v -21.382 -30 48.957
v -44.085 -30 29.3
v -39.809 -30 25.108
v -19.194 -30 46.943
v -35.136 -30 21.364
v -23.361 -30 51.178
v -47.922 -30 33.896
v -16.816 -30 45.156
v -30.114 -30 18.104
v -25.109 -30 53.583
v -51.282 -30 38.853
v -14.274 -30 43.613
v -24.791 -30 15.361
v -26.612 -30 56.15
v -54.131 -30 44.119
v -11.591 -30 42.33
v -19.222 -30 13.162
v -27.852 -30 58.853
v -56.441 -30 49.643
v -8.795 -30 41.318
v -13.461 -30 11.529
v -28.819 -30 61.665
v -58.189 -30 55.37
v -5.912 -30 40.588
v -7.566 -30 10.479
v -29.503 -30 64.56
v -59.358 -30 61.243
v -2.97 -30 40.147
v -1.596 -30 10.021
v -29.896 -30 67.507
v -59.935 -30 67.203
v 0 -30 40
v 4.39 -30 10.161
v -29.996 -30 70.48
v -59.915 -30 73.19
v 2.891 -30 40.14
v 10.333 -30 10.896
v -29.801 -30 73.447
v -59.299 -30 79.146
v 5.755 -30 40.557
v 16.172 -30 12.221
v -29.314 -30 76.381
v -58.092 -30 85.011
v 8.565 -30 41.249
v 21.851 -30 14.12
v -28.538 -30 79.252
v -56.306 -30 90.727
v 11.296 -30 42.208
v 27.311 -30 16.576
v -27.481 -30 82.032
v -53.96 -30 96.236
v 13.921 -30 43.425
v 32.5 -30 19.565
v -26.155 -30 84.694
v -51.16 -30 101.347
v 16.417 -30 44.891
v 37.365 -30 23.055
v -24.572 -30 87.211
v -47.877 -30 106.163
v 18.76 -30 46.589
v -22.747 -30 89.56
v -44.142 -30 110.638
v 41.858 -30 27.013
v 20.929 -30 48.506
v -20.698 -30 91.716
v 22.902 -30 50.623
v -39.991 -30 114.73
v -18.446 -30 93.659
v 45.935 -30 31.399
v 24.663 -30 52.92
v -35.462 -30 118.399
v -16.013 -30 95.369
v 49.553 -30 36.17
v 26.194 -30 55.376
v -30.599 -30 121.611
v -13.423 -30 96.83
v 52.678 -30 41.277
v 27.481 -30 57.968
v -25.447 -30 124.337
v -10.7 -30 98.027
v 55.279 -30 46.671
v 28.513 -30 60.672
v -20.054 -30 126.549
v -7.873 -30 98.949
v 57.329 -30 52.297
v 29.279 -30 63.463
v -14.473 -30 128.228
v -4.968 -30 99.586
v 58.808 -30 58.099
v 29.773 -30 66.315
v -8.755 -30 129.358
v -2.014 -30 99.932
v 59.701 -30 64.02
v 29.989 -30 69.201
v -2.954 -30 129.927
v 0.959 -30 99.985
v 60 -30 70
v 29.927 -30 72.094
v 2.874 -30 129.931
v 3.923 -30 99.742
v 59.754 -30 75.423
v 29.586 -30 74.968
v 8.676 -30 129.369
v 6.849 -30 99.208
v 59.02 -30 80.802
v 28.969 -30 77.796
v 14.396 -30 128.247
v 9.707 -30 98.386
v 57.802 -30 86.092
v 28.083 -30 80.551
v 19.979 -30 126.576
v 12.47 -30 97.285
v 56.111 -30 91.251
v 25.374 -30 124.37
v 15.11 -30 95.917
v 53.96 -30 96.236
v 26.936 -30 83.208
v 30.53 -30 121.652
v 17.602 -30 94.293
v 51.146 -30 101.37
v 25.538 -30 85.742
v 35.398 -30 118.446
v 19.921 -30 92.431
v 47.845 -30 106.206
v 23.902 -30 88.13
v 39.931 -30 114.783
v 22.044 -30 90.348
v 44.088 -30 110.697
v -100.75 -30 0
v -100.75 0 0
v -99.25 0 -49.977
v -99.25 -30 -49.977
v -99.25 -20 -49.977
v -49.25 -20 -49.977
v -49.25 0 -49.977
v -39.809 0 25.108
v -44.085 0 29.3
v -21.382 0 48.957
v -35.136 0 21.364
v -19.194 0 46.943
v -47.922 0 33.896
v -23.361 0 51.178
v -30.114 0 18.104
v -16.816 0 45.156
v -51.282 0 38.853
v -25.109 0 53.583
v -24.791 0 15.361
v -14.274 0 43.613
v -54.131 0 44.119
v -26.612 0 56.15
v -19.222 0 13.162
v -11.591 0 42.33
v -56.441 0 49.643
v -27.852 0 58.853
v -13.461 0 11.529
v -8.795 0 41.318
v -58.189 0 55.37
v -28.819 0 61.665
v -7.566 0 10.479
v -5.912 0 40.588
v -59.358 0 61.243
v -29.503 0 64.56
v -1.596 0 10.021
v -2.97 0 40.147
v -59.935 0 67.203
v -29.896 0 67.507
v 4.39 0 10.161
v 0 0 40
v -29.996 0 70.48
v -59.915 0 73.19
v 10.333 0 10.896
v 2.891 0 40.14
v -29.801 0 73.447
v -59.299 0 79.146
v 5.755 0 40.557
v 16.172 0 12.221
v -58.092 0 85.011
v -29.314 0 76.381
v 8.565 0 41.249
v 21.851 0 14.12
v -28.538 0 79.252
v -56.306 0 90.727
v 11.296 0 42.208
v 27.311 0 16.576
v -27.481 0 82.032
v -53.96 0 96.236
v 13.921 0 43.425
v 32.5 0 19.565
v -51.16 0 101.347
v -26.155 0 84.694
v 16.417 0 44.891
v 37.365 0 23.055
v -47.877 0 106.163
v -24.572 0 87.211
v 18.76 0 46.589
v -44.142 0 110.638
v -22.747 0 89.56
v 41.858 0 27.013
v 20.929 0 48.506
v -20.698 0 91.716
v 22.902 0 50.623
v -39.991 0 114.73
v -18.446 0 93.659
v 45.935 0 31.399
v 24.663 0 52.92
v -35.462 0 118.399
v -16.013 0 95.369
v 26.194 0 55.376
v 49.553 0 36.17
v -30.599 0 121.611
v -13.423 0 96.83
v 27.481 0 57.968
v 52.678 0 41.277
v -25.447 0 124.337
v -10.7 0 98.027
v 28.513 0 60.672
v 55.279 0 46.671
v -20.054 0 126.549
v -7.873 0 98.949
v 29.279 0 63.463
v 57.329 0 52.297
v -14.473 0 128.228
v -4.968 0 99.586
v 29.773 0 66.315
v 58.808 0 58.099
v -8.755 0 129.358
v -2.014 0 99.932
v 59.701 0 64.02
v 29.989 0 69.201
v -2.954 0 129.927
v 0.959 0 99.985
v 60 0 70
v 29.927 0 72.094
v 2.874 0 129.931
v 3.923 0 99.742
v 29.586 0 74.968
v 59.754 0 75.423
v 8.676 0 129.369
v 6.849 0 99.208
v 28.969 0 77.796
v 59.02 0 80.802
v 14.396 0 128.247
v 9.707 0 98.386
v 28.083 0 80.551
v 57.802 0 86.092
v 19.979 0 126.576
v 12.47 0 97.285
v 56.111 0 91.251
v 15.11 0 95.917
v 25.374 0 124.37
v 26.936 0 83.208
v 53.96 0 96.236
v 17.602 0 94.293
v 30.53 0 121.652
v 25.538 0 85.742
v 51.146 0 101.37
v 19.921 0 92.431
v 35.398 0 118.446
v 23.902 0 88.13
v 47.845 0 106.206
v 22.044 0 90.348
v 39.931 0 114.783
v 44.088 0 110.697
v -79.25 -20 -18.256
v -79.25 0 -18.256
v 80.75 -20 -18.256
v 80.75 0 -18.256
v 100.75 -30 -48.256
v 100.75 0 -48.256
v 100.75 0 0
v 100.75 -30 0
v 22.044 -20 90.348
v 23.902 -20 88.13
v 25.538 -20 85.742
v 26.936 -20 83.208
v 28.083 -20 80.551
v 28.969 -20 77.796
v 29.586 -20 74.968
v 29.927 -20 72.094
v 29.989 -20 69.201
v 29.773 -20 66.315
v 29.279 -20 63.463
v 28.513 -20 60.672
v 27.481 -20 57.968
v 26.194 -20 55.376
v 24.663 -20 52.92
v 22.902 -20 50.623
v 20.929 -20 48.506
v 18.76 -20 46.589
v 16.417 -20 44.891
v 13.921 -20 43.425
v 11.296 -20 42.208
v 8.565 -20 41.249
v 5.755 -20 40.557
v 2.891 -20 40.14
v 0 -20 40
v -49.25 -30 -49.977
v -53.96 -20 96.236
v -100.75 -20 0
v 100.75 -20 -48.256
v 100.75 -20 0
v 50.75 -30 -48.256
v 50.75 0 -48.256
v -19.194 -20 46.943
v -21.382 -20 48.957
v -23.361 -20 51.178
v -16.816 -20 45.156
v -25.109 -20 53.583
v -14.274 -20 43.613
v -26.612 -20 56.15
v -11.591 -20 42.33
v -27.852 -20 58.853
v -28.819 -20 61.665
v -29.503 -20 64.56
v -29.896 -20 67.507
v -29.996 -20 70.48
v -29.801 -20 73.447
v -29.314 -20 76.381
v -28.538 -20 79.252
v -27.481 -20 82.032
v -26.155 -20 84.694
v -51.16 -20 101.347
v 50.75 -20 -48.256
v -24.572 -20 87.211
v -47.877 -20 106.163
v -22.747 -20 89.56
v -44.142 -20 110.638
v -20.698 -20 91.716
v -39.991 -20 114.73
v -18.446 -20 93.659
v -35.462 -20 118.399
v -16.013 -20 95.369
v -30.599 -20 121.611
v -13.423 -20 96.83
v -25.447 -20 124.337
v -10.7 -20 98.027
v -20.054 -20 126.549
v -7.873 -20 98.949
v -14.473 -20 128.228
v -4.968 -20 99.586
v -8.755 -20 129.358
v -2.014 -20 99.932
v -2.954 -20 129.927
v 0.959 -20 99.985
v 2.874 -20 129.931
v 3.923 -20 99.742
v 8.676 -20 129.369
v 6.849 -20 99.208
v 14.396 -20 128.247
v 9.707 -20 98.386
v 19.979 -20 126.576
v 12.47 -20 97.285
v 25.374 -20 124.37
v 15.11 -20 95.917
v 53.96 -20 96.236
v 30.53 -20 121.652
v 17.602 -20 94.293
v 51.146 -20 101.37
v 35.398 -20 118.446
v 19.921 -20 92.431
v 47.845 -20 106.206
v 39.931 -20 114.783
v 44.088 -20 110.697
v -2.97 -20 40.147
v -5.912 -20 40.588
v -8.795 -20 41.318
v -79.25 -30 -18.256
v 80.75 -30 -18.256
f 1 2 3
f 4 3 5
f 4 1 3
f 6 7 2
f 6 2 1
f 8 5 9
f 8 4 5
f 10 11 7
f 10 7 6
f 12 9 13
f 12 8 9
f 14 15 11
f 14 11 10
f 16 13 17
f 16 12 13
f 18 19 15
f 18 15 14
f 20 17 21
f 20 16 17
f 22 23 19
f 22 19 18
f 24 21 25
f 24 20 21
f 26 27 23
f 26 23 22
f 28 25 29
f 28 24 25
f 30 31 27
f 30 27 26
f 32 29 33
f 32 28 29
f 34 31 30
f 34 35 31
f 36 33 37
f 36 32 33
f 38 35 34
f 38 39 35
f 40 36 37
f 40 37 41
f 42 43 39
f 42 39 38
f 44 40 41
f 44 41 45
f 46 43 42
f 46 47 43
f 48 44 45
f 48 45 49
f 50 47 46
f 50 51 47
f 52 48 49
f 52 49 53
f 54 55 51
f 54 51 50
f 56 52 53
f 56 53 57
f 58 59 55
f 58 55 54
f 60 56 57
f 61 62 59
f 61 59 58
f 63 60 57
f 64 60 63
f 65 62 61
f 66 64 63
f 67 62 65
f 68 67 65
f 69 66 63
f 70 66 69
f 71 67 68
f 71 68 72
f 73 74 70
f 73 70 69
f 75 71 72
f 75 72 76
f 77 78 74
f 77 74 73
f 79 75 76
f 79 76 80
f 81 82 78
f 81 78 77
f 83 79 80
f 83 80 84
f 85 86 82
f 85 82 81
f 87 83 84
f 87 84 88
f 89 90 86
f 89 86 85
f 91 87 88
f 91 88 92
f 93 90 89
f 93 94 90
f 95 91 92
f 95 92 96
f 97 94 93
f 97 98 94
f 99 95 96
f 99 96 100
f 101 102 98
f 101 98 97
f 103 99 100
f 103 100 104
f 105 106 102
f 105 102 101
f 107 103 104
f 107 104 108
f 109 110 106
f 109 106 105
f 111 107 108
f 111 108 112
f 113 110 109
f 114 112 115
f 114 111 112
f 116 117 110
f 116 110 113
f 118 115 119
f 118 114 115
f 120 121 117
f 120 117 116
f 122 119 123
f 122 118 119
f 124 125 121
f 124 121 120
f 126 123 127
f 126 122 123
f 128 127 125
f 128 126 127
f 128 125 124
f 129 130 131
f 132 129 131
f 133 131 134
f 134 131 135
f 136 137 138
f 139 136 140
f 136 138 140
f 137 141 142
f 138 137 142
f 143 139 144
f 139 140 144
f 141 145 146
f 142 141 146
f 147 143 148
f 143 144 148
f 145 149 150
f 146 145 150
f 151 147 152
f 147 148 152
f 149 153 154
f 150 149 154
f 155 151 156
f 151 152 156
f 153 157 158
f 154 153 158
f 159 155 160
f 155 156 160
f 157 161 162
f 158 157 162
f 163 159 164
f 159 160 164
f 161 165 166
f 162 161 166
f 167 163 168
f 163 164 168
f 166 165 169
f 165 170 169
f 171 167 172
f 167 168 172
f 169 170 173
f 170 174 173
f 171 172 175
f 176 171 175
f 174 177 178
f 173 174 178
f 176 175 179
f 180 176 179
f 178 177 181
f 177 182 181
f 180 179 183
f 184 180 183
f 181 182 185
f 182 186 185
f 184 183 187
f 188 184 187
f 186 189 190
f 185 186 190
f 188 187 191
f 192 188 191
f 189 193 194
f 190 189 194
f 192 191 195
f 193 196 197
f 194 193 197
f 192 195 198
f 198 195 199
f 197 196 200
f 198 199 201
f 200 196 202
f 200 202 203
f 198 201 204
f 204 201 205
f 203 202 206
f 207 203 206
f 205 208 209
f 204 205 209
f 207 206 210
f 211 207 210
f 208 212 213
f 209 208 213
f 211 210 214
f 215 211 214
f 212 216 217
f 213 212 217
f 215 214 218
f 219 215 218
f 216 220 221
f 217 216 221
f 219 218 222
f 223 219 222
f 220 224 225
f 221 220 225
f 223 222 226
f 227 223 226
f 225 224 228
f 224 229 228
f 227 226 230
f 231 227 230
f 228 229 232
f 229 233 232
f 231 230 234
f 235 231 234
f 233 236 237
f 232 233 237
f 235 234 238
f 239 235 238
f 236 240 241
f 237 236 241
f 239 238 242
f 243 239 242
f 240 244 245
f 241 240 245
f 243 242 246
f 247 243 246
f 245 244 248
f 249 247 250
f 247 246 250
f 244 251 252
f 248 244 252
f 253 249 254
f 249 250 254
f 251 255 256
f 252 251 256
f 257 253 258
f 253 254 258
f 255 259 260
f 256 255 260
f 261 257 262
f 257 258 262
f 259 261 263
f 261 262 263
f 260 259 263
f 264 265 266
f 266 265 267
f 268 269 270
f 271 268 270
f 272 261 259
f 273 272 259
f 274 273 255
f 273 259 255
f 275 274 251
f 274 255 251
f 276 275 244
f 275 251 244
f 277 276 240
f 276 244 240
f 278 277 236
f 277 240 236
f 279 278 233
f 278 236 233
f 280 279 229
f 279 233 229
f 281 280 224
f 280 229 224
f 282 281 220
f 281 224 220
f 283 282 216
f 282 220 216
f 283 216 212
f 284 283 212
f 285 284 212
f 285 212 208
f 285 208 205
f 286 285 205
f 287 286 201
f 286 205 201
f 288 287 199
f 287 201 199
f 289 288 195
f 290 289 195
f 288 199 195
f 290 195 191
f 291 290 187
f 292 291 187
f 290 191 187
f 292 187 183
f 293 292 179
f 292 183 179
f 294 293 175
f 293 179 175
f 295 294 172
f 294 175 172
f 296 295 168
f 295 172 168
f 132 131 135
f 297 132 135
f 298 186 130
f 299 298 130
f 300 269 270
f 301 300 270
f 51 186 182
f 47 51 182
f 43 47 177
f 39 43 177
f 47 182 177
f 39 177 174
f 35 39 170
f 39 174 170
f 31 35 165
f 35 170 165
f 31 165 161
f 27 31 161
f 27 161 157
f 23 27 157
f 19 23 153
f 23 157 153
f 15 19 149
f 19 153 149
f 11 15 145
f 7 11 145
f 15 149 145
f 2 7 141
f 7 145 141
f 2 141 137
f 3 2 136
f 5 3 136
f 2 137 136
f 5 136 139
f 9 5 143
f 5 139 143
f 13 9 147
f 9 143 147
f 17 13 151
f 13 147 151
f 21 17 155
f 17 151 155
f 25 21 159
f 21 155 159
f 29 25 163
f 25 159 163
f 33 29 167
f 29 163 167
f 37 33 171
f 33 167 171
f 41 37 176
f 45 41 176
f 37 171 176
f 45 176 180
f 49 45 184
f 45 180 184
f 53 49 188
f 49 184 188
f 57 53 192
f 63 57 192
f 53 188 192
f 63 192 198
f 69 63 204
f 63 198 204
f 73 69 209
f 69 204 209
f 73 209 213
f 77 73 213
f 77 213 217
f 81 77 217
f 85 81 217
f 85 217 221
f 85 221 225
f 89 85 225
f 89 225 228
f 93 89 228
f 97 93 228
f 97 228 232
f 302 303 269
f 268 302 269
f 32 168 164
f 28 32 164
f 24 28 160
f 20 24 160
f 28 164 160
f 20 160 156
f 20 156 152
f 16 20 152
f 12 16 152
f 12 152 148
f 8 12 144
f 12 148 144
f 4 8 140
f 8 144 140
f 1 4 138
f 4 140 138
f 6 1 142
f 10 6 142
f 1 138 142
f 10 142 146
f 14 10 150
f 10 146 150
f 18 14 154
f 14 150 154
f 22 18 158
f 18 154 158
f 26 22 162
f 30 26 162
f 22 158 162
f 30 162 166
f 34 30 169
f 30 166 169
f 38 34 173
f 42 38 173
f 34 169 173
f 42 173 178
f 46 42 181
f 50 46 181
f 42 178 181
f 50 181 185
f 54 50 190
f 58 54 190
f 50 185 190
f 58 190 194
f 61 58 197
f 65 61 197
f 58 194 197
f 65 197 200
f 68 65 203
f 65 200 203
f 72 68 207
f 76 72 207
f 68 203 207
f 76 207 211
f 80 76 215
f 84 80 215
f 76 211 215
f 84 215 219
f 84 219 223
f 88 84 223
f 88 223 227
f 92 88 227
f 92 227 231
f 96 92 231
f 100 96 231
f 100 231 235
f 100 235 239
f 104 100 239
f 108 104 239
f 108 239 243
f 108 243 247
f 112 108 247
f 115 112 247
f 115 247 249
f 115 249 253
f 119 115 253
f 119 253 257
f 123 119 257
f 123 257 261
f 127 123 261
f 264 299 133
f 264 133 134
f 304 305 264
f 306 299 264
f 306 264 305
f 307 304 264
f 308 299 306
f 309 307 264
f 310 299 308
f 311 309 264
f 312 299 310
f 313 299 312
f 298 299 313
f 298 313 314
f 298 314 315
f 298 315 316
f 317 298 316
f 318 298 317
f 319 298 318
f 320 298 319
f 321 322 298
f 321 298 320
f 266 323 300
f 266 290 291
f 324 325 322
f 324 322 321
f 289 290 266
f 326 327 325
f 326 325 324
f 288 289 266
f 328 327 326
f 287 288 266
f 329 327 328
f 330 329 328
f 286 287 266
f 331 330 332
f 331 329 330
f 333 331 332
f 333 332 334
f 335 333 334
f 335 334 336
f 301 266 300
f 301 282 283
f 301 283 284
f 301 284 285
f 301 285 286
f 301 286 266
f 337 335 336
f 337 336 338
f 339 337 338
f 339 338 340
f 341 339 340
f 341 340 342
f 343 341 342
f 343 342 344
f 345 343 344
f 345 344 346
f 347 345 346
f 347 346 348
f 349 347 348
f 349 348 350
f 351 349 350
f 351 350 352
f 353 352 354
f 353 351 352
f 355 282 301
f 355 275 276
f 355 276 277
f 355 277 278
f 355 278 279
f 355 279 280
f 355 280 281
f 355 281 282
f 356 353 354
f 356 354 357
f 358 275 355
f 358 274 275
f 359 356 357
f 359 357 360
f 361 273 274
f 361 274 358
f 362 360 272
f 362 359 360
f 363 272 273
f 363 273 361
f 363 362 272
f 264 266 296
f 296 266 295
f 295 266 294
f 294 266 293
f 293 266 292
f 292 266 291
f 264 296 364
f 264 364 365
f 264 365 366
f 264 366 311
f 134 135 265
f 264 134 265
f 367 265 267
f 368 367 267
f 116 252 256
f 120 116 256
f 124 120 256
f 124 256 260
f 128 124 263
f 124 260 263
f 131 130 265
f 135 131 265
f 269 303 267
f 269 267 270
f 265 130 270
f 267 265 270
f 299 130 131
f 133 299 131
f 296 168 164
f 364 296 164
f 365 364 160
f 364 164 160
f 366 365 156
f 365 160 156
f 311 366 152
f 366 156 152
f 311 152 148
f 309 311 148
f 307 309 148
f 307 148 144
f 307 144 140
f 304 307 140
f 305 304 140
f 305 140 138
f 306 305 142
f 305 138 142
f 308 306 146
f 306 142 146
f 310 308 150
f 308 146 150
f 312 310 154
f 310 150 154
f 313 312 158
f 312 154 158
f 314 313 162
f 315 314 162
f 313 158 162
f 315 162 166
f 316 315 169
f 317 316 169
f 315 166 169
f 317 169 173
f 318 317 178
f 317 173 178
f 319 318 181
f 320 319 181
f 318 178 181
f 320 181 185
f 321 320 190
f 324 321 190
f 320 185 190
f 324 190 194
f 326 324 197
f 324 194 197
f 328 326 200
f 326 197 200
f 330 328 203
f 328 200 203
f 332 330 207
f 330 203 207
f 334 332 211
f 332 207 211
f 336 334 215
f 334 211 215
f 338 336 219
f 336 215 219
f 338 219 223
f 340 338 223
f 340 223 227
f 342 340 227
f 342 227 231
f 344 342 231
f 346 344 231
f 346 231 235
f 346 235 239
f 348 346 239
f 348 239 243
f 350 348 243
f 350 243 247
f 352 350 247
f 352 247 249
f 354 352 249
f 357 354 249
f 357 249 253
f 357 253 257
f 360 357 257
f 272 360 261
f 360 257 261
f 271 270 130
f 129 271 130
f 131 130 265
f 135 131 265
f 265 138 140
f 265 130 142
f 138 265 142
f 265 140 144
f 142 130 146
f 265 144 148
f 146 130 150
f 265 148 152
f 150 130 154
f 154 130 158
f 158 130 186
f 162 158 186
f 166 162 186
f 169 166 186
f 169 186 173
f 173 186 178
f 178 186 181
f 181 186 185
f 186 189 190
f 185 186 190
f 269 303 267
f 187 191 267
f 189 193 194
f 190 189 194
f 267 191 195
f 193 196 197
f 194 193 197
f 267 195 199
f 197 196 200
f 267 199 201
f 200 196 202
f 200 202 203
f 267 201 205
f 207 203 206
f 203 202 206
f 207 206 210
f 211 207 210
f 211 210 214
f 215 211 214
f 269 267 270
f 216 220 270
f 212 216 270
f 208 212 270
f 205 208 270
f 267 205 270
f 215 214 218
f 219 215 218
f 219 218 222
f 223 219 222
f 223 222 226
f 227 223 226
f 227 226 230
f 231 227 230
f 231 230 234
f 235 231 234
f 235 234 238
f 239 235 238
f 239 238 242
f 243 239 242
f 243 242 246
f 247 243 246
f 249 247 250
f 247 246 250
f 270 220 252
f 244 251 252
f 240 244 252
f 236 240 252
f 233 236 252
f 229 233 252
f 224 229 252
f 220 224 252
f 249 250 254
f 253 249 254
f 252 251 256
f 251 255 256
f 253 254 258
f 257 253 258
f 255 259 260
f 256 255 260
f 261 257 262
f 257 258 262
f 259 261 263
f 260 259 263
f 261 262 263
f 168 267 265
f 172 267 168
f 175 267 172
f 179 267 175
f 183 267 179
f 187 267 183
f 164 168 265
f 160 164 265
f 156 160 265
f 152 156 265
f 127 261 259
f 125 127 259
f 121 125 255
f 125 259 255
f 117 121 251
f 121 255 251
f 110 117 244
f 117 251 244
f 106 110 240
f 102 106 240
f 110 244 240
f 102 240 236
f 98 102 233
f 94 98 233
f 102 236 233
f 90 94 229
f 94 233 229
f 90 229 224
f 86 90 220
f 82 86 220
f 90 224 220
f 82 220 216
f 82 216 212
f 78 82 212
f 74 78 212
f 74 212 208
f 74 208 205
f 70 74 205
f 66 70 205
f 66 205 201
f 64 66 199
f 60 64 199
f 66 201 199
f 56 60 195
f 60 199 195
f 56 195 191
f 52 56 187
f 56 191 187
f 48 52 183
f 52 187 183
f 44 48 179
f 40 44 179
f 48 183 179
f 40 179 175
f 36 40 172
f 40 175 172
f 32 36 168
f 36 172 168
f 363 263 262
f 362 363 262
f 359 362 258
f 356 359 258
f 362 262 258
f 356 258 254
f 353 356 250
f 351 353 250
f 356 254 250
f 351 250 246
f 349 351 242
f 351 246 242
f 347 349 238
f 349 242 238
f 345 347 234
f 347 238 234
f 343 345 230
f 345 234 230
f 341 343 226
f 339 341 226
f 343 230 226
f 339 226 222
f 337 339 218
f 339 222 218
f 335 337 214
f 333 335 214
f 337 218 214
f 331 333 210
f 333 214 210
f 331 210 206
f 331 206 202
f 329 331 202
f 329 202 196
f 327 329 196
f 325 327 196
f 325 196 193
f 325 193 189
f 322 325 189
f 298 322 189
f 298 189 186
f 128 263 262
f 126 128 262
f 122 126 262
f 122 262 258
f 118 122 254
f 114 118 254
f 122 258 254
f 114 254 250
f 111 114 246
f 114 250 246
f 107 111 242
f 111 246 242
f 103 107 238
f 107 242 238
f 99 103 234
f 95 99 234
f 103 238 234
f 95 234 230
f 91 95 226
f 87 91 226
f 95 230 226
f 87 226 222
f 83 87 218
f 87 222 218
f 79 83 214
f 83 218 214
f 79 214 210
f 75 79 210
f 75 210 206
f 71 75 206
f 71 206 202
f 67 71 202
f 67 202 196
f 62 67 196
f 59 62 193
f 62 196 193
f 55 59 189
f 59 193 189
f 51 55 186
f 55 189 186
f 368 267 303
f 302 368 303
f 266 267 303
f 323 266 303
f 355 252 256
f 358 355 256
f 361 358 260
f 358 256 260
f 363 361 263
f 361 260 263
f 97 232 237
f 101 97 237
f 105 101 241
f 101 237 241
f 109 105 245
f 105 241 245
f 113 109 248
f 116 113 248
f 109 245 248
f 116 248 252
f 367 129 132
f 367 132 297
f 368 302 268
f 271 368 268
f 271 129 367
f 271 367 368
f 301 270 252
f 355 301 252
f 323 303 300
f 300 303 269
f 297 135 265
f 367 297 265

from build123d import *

# Parameters (mm, degrees)
F1_DEPTH = 30
F2_DEPTH = 20


with BuildPart() as f1:
    # F0 (on Front) → F1 (new body)
    with BuildSketch(Plane.XZ):
        Polygon((0, 0), (-100.7500622123, 0), (-99.2499377877, -49.9774912006), (-49.2499377877, -49.9774912006), (-79.2499377877, -18.2564388961), (80.7500622123, -18.2564388961), (50.7500622123, -48.2564388961), (100.7500622123, -48.2564388961), (100.7500622123, 0), align=None)
    extrude(amount=F1_DEPTH)


with BuildPart() as f1b:
    # F0 (on Front) → F1, piece 2 (new body)
    with BuildSketch(Plane.XZ):
        with BuildLine():
            ThreePointArc((44.0881709789, 110.6968448376), (-8.7547879951, 129.3578443608), (-53.9601399207, 96.2355350571))
            ThreePointArc((-53.9601399207, 96.2355350571), (-50.8632092156, 38.1733767376), (0, 10))
            Line((0, 10), (0, 40))
            ThreePointArc((0, 40), (-21.2132034356, 48.7867965644), (-30, 70))
            ThreePointArc((-30, 70), (-10.9242261812, 97.9403164324), (22.0440854895, 90.3484224188))
            Line((22.0440854895, 90.3484224188), (44.0881709789, 110.6968448376))
        make_face()
        with BuildLine():
            Line((0, 40), (0, 10))
            ThreePointArc((0, 10), (42.4264068712, 27.5735931288), (60, 70))
            ThreePointArc((60, 70), (58.4705412804, 83.4608990182), (53.9601399207, 96.2355350571))
            ThreePointArc((53.9601399207, 96.2355350571), (49.554517329, 103.8282398639), (44.0881709789, 110.6968448376))
            Line((44.0881709789, 110.6968448376), (22.0440854895, 90.3484224188))
            ThreePointArc((22.0440854895, 90.3484224188), (27.9403164324, 80.9242261812), (30, 70))
            ThreePointArc((30, 70), (21.2132034356, 48.7867965644), (0, 40))
        make_face()
    extrude(amount=F1_DEPTH)


with BuildPart() as f2:
    # F0 (on Front) → F2 (new body)
    with BuildSketch(Plane.XZ):
        with BuildLine():
            Line((-53.9601399207, 96.2355350571), (-100.7500622123, 0))
            Line((-100.7500622123, 0), (0, 0))
            Line((0, 0), (0, 10))
            ThreePointArc((0, 10), (-50.8632092156, 38.1733767376), (-53.9601399207, 96.2355350571))
        make_face()
        Polygon((0, 0), (-100.7500622123, 0), (-99.2499377877, -49.9774912006), (-49.2499377877, -49.9774912006), (-79.2499377877, -18.2564388961), (80.7500622123, -18.2564388961), (50.7500622123, -48.2564388961), (100.7500622123, -48.2564388961), (100.7500622123, 0), align=None)
        with BuildLine():
            Line((0, 10), (0, 0))
            Line((0, 0), (100.7500622123, 0))
            Line((100.7500622123, 0), (53.9601399207, 96.2355350571))
            ThreePointArc((53.9601399207, 96.2355350571), (58.4705412804, 83.4608990182), (60, 70))
            ThreePointArc((60, 70), (42.4264068712, 27.5735931288), (0, 10))
        make_face()
        with BuildLine():
            ThreePointArc((44.0881709789, 110.6968448376), (-8.7547879951, 129.3578443608), (-53.9601399207, 96.2355350571))
            ThreePointArc((-53.9601399207, 96.2355350571), (-50.8632092156, 38.1733767376), (0, 10))
            Line((0, 10), (0, 40))
            ThreePointArc((0, 40), (-21.2132034356, 48.7867965644), (-30, 70))
            ThreePointArc((-30, 70), (-10.9242261812, 97.9403164324), (22.0440854895, 90.3484224188))
            Line((22.0440854895, 90.3484224188), (44.0881709789, 110.6968448376))
        make_face()
        with BuildLine():
            Line((0, 40), (0, 10))
            ThreePointArc((0, 10), (42.4264068712, 27.5735931288), (60, 70))
            ThreePointArc((60, 70), (58.4705412804, 83.4608990182), (53.9601399207, 96.2355350571))
            ThreePointArc((53.9601399207, 96.2355350571), (49.554517329, 103.8282398639), (44.0881709789, 110.6968448376))
            Line((44.0881709789, 110.6968448376), (22.0440854895, 90.3484224188))
            ThreePointArc((22.0440854895, 90.3484224188), (27.9403164324, 80.9242261812), (30, 70))
            ThreePointArc((30, 70), (21.2132034356, 48.7867965644), (0, 40))
        make_face()
    extrude(amount=F2_DEPTH)


solid = Compound([f1.part, f1b.part, f2.part])
